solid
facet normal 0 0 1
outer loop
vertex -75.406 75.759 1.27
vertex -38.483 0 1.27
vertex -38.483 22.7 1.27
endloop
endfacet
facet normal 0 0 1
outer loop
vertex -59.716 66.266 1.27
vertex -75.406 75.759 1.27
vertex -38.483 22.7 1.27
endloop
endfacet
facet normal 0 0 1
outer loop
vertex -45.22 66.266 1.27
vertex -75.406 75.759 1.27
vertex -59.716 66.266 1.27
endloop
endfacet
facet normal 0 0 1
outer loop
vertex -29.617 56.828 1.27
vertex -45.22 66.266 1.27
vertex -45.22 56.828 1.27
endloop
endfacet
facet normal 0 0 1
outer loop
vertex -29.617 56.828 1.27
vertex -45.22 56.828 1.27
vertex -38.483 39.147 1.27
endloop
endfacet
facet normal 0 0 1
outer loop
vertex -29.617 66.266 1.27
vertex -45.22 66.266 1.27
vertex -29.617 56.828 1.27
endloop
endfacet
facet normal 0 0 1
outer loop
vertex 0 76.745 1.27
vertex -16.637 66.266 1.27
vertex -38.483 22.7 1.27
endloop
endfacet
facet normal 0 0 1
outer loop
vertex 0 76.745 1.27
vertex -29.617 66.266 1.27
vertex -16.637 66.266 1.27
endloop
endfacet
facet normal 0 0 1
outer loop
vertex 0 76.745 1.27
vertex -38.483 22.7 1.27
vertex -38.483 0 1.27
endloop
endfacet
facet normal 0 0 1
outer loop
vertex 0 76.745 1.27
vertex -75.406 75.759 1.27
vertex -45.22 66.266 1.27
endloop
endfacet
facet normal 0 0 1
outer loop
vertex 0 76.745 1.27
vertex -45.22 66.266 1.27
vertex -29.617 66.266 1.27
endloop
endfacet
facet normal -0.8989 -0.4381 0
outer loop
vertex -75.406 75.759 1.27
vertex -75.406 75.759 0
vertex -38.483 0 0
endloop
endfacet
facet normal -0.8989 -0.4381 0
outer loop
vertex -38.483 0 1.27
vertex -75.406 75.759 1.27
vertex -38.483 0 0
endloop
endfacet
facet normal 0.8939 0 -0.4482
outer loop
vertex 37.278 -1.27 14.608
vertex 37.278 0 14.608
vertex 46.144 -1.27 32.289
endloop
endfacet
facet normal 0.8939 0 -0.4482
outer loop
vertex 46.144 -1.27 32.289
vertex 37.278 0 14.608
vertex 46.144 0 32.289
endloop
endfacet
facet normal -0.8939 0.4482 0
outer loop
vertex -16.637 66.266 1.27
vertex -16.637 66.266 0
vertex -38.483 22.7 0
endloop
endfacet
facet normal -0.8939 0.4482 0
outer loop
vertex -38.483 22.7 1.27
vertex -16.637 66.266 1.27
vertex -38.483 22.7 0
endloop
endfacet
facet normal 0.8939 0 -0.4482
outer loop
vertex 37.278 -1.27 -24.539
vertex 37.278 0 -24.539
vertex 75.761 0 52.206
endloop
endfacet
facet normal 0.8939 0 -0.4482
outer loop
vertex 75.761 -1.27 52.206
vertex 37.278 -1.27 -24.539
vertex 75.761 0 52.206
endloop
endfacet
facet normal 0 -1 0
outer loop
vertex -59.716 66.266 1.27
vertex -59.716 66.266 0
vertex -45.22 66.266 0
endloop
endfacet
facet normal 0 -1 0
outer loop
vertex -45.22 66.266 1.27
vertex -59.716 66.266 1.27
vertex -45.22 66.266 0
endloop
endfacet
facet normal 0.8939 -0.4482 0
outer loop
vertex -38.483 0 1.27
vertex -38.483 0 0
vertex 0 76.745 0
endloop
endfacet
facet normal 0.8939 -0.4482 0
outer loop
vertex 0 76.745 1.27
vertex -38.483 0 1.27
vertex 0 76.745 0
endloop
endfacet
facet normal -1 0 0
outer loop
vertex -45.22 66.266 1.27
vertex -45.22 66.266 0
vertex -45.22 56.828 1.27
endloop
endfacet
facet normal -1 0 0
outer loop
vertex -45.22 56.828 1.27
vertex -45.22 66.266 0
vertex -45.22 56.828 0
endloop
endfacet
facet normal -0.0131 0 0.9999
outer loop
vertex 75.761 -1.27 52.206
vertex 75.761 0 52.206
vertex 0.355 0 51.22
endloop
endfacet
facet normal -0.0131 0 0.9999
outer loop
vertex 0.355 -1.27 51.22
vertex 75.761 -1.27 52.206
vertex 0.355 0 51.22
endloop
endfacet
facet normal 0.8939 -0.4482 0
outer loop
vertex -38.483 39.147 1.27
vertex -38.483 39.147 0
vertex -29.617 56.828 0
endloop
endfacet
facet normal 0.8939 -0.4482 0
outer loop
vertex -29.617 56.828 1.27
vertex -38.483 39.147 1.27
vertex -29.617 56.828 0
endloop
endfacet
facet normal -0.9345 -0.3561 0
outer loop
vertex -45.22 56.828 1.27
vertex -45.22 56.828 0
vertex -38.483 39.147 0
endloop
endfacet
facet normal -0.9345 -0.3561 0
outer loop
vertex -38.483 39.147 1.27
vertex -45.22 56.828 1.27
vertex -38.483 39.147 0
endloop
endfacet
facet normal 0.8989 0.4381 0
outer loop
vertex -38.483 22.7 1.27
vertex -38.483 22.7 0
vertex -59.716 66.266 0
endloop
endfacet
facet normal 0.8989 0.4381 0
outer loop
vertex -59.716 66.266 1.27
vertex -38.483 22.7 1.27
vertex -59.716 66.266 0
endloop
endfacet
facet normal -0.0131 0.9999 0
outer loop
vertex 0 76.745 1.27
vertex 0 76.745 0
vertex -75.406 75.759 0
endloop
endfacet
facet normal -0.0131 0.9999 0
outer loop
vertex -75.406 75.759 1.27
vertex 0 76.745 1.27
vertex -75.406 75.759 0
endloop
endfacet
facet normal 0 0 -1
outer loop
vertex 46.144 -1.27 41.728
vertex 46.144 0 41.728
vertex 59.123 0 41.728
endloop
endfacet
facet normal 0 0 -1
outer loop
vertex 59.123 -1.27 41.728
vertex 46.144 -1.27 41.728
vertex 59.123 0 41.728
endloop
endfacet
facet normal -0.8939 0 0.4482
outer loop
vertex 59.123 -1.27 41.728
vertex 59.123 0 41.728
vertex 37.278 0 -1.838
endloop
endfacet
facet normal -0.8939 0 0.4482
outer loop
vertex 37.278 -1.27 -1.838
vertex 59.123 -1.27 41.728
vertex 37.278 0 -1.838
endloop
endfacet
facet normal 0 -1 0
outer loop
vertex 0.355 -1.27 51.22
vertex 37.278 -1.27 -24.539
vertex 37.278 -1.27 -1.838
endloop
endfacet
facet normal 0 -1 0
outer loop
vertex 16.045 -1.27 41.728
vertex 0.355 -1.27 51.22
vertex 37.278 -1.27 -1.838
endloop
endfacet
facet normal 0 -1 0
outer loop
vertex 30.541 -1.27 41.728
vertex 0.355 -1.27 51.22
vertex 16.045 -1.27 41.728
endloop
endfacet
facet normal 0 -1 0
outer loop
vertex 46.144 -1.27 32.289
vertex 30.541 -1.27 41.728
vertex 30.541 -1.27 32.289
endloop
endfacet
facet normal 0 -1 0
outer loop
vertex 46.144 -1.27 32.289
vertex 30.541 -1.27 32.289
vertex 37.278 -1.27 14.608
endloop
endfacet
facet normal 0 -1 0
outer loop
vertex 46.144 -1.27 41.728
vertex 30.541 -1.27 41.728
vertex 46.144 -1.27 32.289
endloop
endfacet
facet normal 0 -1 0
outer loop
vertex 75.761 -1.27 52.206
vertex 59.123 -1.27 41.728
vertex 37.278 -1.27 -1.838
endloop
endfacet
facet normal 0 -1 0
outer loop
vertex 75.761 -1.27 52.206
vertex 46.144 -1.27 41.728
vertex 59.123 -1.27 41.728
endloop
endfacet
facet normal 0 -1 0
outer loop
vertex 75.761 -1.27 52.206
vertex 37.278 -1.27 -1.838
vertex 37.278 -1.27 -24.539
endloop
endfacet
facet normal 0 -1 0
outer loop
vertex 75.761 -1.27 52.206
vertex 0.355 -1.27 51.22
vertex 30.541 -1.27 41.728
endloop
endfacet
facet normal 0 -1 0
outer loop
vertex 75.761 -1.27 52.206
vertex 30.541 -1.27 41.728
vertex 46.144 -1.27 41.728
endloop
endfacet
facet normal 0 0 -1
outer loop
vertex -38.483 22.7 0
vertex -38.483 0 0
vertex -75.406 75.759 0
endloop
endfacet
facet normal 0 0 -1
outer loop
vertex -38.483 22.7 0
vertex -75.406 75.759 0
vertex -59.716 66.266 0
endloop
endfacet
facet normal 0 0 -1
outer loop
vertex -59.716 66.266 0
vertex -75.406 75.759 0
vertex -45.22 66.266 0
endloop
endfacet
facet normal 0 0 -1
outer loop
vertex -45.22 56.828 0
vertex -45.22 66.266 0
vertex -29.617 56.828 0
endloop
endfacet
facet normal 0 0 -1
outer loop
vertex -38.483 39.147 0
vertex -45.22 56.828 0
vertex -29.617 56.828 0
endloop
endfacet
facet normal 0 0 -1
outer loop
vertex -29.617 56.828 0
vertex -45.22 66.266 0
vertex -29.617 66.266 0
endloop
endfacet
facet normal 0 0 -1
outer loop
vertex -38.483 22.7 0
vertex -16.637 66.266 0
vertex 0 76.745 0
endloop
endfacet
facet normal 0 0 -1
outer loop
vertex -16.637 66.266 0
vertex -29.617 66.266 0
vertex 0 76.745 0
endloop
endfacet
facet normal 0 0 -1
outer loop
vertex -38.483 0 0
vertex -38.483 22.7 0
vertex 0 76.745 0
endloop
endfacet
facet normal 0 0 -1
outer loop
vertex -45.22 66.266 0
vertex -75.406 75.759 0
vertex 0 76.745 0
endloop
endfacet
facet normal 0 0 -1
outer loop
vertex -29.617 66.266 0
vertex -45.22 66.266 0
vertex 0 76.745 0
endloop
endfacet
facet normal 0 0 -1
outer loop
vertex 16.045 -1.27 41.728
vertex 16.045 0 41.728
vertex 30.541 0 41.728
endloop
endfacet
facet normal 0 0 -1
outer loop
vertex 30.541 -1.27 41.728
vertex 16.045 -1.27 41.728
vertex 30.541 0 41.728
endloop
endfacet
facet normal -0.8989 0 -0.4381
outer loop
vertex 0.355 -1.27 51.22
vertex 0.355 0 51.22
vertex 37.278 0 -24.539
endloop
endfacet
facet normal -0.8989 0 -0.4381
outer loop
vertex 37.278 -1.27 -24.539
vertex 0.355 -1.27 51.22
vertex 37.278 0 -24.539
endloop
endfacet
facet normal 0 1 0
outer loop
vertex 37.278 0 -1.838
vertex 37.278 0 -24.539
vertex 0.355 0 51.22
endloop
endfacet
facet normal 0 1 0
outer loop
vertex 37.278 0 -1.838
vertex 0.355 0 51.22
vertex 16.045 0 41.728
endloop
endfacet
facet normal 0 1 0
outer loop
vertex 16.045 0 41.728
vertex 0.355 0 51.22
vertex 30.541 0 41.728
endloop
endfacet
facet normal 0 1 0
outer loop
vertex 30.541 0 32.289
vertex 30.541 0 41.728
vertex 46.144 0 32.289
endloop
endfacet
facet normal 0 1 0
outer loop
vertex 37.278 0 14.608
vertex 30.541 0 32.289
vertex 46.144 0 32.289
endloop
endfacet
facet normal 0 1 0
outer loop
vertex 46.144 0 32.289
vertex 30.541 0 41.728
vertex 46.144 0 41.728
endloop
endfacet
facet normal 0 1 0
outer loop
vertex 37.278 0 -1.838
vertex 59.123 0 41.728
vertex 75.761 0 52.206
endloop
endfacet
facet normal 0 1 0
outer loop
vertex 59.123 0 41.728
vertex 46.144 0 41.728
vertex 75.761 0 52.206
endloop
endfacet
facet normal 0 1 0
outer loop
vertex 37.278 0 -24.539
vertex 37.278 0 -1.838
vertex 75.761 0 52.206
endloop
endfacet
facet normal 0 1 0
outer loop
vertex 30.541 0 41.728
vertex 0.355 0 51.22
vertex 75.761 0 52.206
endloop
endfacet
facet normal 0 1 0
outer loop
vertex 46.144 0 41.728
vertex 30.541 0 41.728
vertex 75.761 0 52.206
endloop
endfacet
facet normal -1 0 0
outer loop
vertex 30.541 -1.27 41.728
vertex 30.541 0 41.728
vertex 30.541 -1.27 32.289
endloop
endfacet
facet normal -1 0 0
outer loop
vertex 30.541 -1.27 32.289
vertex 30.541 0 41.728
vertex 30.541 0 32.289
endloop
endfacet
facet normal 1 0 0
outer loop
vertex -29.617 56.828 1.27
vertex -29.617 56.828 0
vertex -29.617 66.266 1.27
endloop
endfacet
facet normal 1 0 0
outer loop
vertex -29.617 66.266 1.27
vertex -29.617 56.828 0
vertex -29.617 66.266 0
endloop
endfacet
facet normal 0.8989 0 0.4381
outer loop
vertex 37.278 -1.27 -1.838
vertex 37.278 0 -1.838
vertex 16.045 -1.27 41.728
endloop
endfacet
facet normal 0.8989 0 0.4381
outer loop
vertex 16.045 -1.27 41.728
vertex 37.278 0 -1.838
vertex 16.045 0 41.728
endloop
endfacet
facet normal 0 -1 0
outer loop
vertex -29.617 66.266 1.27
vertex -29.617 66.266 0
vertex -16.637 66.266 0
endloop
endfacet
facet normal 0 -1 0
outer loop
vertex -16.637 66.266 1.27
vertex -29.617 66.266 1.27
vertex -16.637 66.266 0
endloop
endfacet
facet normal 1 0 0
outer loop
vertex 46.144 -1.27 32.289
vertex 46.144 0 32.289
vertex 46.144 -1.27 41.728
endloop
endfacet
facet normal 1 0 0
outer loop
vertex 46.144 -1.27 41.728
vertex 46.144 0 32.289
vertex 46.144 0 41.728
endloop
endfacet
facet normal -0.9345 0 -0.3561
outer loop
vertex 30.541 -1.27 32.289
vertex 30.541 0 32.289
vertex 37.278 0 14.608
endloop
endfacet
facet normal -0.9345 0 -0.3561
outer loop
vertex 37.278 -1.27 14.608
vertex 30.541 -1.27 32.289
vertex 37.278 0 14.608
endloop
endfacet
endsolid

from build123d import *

# Parameters (mm, degrees)
F1_DEPTH = 1.27
F3_DEPTH = 1.27


with BuildPart() as f1:
    # F0 (on Top) → F1 (new body)
    with BuildSketch(Plane.XY):
        Polygon((0, 76.744989), (-75.406281, 75.758584), (-38.48308, 0), align=None)
        Polygon((-38.48308, 22.700268), (-59.716203, 66.266137), (-45.220136, 66.266137), (-45.220136, 56.827694), (-38.48308, 39.146576), (-29.617043, 56.827694), (-29.617043, 66.266137), (-16.637369, 66.266137), align=None, mode=Mode.SUBTRACT)
    extrude(amount=F1_DEPTH)


with BuildPart() as f3:
    # F2 (on Front) → F3 (new body)
    with BuildSketch(Plane.XZ):
        Polygon((75.760864, 52.206486), (0.354584, 51.220081), (37.277785, -24.538503), align=None)
        Polygon((37.277785, -1.838235), (16.044662, 41.727634), (30.540728, 41.727634), (30.540728, 32.289191), (37.277785, 14.608073), (46.143821, 32.289191), (46.143821, 41.727634), (59.123495, 41.727634), align=None, mode=Mode.SUBTRACT)
    extrude(amount=F3_DEPTH)


solid = Compound([f1.part, f3.part])
